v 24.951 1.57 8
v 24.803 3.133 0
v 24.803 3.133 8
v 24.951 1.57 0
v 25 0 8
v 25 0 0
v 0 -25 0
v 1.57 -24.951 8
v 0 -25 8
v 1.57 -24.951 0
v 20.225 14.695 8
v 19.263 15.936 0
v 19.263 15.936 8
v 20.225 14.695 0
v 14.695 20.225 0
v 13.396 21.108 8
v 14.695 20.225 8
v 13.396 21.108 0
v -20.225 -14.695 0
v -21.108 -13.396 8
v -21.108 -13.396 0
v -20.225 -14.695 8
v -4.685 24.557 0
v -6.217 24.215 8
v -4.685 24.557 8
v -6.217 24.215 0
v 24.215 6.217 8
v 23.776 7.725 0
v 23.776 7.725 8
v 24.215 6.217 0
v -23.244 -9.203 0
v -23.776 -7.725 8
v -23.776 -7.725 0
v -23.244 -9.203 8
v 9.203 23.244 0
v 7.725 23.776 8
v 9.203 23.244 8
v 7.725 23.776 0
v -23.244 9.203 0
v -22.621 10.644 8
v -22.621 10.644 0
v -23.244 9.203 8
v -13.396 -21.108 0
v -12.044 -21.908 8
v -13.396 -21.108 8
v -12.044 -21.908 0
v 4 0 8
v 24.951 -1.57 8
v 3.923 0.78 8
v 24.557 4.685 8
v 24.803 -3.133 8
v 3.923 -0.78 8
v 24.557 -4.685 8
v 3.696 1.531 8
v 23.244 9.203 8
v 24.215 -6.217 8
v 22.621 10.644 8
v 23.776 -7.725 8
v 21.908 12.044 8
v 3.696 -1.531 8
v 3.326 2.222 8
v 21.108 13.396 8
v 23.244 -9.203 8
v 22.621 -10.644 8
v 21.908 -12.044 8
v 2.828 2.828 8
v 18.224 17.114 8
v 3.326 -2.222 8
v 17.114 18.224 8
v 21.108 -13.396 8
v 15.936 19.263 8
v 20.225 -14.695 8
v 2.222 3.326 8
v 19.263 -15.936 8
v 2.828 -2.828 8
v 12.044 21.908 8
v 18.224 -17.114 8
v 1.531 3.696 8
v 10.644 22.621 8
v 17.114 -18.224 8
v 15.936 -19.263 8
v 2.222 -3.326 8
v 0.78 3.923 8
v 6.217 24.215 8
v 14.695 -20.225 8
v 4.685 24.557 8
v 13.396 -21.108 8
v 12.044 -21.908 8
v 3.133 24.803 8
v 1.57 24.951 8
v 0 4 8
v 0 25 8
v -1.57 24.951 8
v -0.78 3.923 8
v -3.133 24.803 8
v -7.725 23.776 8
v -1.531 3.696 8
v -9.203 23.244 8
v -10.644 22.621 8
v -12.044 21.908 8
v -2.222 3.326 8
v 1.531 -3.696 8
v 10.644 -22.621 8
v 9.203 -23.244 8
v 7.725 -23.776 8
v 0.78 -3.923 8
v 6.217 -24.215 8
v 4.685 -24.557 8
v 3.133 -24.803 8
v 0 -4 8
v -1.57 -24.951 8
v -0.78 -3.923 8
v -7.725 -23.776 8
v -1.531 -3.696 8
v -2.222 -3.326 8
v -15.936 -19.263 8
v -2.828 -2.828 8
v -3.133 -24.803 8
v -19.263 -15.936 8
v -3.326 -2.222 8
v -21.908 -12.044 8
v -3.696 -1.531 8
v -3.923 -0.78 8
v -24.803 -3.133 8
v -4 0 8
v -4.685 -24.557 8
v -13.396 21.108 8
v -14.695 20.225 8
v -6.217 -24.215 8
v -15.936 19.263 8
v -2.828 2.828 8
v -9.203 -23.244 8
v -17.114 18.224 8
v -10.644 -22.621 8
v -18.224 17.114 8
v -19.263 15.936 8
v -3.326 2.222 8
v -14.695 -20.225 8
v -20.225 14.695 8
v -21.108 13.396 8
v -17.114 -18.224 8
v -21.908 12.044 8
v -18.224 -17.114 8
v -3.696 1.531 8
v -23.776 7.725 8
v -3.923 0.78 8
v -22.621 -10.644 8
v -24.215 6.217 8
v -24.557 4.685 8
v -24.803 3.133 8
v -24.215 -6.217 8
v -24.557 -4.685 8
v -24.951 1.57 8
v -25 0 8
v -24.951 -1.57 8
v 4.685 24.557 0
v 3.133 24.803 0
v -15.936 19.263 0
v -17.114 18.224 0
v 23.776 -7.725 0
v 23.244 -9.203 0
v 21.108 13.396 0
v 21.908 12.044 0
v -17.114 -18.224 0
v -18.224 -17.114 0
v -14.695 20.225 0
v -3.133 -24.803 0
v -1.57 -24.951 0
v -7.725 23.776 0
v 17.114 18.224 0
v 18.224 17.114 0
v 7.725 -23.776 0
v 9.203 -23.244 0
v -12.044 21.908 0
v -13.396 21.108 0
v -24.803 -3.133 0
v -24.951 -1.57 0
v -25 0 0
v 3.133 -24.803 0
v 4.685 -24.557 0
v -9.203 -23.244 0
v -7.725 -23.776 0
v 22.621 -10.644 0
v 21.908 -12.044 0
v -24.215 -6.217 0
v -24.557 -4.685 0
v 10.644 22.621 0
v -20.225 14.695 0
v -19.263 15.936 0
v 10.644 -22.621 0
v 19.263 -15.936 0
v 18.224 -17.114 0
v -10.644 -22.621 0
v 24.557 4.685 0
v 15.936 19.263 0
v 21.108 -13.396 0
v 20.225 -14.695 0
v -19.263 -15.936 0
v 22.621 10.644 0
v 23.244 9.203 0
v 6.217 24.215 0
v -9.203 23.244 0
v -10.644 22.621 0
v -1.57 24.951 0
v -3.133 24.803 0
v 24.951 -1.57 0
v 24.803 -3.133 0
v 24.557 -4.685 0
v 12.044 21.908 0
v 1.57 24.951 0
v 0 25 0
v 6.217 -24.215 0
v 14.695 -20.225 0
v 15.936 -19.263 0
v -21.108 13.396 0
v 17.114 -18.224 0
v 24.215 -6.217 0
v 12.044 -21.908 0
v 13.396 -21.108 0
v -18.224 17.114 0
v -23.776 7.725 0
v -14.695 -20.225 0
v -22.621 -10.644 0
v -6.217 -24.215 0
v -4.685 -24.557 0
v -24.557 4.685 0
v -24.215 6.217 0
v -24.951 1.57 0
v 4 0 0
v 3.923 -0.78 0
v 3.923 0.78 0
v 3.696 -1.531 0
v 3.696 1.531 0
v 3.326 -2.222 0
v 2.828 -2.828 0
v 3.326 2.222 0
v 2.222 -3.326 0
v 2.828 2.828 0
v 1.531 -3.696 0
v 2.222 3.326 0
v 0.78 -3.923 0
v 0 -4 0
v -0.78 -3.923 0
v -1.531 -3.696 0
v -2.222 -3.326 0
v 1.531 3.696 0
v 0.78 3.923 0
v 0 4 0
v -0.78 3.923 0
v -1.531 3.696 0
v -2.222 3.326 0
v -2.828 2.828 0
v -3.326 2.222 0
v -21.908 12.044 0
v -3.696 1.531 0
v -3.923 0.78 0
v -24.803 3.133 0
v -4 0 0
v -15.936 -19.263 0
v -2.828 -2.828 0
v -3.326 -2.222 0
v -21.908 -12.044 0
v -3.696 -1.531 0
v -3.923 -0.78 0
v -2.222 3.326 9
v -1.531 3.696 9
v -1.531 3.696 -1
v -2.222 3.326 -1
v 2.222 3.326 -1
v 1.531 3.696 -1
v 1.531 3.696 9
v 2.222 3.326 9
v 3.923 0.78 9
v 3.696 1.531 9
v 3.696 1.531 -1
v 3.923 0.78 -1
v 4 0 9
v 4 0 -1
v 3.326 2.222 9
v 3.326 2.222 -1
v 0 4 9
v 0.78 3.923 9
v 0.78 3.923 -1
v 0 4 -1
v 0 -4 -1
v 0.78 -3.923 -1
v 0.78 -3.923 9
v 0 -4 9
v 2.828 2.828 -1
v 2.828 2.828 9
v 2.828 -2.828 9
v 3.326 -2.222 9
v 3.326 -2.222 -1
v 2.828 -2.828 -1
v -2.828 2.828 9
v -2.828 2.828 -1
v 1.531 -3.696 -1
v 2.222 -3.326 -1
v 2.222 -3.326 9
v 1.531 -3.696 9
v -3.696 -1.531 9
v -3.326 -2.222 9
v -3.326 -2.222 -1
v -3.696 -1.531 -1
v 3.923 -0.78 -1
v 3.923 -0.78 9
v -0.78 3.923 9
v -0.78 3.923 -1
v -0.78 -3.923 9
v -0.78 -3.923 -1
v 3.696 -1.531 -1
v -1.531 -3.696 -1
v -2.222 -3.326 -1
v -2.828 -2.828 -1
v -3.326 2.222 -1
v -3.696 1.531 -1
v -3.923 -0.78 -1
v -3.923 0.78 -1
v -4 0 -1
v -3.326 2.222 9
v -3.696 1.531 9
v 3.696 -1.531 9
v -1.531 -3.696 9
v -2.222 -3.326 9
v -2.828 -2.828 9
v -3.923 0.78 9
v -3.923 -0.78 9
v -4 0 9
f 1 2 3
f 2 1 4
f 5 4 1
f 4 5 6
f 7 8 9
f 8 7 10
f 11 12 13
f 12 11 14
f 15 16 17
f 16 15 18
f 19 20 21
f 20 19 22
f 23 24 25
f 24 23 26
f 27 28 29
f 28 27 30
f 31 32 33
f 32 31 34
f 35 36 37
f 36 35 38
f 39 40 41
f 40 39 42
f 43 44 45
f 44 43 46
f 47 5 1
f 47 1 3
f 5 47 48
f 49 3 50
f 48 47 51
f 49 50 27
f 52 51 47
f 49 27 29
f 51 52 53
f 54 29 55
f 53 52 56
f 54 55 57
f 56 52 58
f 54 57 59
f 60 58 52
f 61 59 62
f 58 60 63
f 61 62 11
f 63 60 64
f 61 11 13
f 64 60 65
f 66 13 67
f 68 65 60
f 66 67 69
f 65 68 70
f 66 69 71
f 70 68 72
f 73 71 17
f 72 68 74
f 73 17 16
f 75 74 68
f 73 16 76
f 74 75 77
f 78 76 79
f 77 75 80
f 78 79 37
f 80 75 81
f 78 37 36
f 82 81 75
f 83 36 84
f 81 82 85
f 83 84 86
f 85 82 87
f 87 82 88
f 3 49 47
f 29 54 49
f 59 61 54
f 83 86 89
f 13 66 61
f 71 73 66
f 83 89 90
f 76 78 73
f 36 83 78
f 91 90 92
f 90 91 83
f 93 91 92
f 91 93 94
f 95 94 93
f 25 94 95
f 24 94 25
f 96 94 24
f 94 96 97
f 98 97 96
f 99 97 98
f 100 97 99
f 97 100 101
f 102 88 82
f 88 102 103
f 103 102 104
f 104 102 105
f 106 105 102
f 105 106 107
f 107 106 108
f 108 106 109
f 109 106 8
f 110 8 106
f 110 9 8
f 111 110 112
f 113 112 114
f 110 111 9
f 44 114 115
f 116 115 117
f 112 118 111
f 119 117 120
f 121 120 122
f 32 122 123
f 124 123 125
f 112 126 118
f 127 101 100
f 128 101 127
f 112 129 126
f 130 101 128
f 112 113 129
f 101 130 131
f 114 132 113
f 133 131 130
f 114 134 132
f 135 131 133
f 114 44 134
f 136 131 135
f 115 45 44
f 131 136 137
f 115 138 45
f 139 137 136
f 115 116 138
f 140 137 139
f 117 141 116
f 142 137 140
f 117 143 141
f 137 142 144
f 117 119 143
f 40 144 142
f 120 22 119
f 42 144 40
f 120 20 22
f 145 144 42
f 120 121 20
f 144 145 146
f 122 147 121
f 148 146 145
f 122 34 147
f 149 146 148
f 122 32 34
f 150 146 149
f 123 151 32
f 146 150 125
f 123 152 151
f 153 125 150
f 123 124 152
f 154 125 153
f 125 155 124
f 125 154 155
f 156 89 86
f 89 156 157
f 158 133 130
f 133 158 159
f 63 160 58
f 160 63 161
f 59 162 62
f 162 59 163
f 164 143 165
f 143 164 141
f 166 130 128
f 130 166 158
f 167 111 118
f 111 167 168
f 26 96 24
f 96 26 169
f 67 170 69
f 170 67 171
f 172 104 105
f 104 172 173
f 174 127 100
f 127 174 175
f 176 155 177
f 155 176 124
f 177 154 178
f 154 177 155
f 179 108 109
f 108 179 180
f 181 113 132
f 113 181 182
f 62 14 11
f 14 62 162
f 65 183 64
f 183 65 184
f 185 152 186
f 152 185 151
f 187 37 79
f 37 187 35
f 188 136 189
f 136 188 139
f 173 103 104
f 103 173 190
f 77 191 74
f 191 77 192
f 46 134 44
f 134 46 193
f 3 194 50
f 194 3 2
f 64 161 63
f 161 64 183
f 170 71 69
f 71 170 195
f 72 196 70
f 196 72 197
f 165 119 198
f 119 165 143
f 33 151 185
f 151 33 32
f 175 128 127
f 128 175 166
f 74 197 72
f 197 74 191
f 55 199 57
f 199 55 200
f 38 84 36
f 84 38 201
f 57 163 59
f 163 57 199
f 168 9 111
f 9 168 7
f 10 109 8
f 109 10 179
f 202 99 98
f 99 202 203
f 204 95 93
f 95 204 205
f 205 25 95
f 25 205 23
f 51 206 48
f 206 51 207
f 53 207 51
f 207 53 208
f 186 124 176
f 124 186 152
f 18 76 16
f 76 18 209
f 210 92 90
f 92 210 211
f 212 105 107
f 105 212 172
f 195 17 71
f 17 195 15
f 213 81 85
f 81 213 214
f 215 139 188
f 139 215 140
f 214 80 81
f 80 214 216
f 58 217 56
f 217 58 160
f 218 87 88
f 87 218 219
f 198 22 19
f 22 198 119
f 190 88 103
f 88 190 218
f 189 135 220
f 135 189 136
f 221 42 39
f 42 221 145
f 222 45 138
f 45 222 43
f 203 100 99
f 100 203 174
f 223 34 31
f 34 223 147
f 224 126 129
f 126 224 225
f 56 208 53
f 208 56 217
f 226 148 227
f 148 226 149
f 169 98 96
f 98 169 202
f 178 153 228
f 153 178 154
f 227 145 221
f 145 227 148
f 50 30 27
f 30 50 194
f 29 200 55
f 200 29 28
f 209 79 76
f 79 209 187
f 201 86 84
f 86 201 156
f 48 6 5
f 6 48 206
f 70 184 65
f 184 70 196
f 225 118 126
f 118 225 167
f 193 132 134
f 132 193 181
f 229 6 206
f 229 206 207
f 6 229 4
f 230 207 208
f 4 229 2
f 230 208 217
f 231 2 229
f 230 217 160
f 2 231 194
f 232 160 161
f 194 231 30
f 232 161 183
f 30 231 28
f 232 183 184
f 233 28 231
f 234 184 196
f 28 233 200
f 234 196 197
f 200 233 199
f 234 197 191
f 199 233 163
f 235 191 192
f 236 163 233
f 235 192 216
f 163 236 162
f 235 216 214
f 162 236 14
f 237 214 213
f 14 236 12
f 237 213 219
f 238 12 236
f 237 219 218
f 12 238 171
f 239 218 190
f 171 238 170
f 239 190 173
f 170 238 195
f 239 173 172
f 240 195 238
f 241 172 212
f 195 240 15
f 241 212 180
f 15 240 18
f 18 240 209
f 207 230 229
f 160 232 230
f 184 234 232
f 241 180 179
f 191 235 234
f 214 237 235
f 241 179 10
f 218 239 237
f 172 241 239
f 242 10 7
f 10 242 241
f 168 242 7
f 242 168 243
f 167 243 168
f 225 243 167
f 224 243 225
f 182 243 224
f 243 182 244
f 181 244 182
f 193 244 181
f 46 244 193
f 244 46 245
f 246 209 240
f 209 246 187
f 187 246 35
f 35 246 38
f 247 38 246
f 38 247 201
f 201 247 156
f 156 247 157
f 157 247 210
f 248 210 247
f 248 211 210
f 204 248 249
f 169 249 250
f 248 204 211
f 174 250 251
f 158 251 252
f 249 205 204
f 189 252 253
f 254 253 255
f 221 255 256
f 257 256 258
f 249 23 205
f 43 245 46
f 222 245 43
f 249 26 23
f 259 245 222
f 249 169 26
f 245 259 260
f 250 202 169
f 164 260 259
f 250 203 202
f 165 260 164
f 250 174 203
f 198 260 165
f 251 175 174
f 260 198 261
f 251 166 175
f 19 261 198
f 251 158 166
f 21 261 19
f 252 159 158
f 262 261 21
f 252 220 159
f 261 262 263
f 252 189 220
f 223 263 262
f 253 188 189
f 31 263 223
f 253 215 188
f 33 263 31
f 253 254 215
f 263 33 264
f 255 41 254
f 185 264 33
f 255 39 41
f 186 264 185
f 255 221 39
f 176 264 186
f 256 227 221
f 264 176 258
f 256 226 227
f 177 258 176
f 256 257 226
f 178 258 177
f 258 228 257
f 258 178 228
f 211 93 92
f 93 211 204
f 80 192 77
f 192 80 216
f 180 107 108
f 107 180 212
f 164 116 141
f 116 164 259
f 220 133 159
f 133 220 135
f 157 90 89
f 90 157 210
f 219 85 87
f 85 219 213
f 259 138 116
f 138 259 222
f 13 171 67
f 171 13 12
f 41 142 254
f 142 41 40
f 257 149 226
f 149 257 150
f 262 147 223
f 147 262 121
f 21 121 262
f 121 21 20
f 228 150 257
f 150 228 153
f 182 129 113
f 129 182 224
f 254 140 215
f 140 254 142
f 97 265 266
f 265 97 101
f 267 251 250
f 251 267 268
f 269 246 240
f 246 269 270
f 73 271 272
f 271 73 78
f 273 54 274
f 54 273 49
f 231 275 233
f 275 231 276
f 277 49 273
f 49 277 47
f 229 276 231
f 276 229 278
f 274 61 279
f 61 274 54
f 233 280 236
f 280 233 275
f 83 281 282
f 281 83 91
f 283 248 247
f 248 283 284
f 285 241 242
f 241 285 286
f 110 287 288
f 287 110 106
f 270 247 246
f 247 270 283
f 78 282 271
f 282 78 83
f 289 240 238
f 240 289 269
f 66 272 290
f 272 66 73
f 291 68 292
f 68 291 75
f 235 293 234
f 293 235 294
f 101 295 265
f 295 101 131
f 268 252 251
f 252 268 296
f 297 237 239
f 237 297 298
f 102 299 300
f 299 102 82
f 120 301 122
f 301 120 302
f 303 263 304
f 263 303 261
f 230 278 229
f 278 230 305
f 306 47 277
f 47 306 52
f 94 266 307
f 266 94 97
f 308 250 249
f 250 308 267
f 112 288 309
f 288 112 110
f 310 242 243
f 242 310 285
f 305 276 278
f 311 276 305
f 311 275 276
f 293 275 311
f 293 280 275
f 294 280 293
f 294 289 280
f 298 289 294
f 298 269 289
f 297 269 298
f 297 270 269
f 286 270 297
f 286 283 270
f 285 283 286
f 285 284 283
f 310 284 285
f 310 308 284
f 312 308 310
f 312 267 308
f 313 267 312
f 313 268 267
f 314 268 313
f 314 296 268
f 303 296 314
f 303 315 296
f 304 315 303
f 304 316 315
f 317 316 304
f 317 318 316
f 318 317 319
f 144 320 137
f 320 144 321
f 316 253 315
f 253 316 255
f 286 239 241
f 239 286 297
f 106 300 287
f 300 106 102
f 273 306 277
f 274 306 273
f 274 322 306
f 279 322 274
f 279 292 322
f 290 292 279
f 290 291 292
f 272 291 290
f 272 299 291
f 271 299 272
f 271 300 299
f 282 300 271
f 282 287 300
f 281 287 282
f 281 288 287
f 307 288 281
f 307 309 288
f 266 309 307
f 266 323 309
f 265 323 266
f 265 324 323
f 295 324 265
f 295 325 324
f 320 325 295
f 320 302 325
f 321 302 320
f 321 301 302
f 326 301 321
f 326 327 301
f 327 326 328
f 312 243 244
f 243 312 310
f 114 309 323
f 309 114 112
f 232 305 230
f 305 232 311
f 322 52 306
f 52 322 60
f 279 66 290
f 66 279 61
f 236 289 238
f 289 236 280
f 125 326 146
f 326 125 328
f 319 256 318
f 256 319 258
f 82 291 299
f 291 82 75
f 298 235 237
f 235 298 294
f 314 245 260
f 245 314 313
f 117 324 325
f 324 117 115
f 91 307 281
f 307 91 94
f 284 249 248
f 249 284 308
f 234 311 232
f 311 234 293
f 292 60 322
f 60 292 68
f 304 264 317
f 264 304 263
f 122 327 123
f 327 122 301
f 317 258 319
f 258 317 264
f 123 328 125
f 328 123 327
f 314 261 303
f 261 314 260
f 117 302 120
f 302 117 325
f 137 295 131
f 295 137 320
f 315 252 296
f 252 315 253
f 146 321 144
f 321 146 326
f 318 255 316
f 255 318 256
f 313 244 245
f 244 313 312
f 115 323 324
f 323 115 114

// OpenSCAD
// file: config.scad
// --- Robot Dimensions ---
track_width = 50;        // mm
sprocket_diameter = 50;  // mm
motor_length = 54;       // mm
motor_shaft = 6;         // D-shaft diameter
motor_mount_hole = 3;    // M3
battery_length = 75;     // mm
battery_width  = 55;     // mm
battery_height = 20;     // mm
jetson_plate_length = 120; // mm
jetson_plate_width  = 100; // mm
chassis_thickness = 5;      // mm
// main file
include <config.scad>;

module idler_wheel(diameter = 50, thickness = 8) {
    // Wheel
    cylinder(h = thickness, r = diameter/2, $fn=100);
    
    // Axle hole
    translate([0,0,-1])
        cylinder(h = thickness+2, r = 4, $fn=32);
}

idler_wheel();
